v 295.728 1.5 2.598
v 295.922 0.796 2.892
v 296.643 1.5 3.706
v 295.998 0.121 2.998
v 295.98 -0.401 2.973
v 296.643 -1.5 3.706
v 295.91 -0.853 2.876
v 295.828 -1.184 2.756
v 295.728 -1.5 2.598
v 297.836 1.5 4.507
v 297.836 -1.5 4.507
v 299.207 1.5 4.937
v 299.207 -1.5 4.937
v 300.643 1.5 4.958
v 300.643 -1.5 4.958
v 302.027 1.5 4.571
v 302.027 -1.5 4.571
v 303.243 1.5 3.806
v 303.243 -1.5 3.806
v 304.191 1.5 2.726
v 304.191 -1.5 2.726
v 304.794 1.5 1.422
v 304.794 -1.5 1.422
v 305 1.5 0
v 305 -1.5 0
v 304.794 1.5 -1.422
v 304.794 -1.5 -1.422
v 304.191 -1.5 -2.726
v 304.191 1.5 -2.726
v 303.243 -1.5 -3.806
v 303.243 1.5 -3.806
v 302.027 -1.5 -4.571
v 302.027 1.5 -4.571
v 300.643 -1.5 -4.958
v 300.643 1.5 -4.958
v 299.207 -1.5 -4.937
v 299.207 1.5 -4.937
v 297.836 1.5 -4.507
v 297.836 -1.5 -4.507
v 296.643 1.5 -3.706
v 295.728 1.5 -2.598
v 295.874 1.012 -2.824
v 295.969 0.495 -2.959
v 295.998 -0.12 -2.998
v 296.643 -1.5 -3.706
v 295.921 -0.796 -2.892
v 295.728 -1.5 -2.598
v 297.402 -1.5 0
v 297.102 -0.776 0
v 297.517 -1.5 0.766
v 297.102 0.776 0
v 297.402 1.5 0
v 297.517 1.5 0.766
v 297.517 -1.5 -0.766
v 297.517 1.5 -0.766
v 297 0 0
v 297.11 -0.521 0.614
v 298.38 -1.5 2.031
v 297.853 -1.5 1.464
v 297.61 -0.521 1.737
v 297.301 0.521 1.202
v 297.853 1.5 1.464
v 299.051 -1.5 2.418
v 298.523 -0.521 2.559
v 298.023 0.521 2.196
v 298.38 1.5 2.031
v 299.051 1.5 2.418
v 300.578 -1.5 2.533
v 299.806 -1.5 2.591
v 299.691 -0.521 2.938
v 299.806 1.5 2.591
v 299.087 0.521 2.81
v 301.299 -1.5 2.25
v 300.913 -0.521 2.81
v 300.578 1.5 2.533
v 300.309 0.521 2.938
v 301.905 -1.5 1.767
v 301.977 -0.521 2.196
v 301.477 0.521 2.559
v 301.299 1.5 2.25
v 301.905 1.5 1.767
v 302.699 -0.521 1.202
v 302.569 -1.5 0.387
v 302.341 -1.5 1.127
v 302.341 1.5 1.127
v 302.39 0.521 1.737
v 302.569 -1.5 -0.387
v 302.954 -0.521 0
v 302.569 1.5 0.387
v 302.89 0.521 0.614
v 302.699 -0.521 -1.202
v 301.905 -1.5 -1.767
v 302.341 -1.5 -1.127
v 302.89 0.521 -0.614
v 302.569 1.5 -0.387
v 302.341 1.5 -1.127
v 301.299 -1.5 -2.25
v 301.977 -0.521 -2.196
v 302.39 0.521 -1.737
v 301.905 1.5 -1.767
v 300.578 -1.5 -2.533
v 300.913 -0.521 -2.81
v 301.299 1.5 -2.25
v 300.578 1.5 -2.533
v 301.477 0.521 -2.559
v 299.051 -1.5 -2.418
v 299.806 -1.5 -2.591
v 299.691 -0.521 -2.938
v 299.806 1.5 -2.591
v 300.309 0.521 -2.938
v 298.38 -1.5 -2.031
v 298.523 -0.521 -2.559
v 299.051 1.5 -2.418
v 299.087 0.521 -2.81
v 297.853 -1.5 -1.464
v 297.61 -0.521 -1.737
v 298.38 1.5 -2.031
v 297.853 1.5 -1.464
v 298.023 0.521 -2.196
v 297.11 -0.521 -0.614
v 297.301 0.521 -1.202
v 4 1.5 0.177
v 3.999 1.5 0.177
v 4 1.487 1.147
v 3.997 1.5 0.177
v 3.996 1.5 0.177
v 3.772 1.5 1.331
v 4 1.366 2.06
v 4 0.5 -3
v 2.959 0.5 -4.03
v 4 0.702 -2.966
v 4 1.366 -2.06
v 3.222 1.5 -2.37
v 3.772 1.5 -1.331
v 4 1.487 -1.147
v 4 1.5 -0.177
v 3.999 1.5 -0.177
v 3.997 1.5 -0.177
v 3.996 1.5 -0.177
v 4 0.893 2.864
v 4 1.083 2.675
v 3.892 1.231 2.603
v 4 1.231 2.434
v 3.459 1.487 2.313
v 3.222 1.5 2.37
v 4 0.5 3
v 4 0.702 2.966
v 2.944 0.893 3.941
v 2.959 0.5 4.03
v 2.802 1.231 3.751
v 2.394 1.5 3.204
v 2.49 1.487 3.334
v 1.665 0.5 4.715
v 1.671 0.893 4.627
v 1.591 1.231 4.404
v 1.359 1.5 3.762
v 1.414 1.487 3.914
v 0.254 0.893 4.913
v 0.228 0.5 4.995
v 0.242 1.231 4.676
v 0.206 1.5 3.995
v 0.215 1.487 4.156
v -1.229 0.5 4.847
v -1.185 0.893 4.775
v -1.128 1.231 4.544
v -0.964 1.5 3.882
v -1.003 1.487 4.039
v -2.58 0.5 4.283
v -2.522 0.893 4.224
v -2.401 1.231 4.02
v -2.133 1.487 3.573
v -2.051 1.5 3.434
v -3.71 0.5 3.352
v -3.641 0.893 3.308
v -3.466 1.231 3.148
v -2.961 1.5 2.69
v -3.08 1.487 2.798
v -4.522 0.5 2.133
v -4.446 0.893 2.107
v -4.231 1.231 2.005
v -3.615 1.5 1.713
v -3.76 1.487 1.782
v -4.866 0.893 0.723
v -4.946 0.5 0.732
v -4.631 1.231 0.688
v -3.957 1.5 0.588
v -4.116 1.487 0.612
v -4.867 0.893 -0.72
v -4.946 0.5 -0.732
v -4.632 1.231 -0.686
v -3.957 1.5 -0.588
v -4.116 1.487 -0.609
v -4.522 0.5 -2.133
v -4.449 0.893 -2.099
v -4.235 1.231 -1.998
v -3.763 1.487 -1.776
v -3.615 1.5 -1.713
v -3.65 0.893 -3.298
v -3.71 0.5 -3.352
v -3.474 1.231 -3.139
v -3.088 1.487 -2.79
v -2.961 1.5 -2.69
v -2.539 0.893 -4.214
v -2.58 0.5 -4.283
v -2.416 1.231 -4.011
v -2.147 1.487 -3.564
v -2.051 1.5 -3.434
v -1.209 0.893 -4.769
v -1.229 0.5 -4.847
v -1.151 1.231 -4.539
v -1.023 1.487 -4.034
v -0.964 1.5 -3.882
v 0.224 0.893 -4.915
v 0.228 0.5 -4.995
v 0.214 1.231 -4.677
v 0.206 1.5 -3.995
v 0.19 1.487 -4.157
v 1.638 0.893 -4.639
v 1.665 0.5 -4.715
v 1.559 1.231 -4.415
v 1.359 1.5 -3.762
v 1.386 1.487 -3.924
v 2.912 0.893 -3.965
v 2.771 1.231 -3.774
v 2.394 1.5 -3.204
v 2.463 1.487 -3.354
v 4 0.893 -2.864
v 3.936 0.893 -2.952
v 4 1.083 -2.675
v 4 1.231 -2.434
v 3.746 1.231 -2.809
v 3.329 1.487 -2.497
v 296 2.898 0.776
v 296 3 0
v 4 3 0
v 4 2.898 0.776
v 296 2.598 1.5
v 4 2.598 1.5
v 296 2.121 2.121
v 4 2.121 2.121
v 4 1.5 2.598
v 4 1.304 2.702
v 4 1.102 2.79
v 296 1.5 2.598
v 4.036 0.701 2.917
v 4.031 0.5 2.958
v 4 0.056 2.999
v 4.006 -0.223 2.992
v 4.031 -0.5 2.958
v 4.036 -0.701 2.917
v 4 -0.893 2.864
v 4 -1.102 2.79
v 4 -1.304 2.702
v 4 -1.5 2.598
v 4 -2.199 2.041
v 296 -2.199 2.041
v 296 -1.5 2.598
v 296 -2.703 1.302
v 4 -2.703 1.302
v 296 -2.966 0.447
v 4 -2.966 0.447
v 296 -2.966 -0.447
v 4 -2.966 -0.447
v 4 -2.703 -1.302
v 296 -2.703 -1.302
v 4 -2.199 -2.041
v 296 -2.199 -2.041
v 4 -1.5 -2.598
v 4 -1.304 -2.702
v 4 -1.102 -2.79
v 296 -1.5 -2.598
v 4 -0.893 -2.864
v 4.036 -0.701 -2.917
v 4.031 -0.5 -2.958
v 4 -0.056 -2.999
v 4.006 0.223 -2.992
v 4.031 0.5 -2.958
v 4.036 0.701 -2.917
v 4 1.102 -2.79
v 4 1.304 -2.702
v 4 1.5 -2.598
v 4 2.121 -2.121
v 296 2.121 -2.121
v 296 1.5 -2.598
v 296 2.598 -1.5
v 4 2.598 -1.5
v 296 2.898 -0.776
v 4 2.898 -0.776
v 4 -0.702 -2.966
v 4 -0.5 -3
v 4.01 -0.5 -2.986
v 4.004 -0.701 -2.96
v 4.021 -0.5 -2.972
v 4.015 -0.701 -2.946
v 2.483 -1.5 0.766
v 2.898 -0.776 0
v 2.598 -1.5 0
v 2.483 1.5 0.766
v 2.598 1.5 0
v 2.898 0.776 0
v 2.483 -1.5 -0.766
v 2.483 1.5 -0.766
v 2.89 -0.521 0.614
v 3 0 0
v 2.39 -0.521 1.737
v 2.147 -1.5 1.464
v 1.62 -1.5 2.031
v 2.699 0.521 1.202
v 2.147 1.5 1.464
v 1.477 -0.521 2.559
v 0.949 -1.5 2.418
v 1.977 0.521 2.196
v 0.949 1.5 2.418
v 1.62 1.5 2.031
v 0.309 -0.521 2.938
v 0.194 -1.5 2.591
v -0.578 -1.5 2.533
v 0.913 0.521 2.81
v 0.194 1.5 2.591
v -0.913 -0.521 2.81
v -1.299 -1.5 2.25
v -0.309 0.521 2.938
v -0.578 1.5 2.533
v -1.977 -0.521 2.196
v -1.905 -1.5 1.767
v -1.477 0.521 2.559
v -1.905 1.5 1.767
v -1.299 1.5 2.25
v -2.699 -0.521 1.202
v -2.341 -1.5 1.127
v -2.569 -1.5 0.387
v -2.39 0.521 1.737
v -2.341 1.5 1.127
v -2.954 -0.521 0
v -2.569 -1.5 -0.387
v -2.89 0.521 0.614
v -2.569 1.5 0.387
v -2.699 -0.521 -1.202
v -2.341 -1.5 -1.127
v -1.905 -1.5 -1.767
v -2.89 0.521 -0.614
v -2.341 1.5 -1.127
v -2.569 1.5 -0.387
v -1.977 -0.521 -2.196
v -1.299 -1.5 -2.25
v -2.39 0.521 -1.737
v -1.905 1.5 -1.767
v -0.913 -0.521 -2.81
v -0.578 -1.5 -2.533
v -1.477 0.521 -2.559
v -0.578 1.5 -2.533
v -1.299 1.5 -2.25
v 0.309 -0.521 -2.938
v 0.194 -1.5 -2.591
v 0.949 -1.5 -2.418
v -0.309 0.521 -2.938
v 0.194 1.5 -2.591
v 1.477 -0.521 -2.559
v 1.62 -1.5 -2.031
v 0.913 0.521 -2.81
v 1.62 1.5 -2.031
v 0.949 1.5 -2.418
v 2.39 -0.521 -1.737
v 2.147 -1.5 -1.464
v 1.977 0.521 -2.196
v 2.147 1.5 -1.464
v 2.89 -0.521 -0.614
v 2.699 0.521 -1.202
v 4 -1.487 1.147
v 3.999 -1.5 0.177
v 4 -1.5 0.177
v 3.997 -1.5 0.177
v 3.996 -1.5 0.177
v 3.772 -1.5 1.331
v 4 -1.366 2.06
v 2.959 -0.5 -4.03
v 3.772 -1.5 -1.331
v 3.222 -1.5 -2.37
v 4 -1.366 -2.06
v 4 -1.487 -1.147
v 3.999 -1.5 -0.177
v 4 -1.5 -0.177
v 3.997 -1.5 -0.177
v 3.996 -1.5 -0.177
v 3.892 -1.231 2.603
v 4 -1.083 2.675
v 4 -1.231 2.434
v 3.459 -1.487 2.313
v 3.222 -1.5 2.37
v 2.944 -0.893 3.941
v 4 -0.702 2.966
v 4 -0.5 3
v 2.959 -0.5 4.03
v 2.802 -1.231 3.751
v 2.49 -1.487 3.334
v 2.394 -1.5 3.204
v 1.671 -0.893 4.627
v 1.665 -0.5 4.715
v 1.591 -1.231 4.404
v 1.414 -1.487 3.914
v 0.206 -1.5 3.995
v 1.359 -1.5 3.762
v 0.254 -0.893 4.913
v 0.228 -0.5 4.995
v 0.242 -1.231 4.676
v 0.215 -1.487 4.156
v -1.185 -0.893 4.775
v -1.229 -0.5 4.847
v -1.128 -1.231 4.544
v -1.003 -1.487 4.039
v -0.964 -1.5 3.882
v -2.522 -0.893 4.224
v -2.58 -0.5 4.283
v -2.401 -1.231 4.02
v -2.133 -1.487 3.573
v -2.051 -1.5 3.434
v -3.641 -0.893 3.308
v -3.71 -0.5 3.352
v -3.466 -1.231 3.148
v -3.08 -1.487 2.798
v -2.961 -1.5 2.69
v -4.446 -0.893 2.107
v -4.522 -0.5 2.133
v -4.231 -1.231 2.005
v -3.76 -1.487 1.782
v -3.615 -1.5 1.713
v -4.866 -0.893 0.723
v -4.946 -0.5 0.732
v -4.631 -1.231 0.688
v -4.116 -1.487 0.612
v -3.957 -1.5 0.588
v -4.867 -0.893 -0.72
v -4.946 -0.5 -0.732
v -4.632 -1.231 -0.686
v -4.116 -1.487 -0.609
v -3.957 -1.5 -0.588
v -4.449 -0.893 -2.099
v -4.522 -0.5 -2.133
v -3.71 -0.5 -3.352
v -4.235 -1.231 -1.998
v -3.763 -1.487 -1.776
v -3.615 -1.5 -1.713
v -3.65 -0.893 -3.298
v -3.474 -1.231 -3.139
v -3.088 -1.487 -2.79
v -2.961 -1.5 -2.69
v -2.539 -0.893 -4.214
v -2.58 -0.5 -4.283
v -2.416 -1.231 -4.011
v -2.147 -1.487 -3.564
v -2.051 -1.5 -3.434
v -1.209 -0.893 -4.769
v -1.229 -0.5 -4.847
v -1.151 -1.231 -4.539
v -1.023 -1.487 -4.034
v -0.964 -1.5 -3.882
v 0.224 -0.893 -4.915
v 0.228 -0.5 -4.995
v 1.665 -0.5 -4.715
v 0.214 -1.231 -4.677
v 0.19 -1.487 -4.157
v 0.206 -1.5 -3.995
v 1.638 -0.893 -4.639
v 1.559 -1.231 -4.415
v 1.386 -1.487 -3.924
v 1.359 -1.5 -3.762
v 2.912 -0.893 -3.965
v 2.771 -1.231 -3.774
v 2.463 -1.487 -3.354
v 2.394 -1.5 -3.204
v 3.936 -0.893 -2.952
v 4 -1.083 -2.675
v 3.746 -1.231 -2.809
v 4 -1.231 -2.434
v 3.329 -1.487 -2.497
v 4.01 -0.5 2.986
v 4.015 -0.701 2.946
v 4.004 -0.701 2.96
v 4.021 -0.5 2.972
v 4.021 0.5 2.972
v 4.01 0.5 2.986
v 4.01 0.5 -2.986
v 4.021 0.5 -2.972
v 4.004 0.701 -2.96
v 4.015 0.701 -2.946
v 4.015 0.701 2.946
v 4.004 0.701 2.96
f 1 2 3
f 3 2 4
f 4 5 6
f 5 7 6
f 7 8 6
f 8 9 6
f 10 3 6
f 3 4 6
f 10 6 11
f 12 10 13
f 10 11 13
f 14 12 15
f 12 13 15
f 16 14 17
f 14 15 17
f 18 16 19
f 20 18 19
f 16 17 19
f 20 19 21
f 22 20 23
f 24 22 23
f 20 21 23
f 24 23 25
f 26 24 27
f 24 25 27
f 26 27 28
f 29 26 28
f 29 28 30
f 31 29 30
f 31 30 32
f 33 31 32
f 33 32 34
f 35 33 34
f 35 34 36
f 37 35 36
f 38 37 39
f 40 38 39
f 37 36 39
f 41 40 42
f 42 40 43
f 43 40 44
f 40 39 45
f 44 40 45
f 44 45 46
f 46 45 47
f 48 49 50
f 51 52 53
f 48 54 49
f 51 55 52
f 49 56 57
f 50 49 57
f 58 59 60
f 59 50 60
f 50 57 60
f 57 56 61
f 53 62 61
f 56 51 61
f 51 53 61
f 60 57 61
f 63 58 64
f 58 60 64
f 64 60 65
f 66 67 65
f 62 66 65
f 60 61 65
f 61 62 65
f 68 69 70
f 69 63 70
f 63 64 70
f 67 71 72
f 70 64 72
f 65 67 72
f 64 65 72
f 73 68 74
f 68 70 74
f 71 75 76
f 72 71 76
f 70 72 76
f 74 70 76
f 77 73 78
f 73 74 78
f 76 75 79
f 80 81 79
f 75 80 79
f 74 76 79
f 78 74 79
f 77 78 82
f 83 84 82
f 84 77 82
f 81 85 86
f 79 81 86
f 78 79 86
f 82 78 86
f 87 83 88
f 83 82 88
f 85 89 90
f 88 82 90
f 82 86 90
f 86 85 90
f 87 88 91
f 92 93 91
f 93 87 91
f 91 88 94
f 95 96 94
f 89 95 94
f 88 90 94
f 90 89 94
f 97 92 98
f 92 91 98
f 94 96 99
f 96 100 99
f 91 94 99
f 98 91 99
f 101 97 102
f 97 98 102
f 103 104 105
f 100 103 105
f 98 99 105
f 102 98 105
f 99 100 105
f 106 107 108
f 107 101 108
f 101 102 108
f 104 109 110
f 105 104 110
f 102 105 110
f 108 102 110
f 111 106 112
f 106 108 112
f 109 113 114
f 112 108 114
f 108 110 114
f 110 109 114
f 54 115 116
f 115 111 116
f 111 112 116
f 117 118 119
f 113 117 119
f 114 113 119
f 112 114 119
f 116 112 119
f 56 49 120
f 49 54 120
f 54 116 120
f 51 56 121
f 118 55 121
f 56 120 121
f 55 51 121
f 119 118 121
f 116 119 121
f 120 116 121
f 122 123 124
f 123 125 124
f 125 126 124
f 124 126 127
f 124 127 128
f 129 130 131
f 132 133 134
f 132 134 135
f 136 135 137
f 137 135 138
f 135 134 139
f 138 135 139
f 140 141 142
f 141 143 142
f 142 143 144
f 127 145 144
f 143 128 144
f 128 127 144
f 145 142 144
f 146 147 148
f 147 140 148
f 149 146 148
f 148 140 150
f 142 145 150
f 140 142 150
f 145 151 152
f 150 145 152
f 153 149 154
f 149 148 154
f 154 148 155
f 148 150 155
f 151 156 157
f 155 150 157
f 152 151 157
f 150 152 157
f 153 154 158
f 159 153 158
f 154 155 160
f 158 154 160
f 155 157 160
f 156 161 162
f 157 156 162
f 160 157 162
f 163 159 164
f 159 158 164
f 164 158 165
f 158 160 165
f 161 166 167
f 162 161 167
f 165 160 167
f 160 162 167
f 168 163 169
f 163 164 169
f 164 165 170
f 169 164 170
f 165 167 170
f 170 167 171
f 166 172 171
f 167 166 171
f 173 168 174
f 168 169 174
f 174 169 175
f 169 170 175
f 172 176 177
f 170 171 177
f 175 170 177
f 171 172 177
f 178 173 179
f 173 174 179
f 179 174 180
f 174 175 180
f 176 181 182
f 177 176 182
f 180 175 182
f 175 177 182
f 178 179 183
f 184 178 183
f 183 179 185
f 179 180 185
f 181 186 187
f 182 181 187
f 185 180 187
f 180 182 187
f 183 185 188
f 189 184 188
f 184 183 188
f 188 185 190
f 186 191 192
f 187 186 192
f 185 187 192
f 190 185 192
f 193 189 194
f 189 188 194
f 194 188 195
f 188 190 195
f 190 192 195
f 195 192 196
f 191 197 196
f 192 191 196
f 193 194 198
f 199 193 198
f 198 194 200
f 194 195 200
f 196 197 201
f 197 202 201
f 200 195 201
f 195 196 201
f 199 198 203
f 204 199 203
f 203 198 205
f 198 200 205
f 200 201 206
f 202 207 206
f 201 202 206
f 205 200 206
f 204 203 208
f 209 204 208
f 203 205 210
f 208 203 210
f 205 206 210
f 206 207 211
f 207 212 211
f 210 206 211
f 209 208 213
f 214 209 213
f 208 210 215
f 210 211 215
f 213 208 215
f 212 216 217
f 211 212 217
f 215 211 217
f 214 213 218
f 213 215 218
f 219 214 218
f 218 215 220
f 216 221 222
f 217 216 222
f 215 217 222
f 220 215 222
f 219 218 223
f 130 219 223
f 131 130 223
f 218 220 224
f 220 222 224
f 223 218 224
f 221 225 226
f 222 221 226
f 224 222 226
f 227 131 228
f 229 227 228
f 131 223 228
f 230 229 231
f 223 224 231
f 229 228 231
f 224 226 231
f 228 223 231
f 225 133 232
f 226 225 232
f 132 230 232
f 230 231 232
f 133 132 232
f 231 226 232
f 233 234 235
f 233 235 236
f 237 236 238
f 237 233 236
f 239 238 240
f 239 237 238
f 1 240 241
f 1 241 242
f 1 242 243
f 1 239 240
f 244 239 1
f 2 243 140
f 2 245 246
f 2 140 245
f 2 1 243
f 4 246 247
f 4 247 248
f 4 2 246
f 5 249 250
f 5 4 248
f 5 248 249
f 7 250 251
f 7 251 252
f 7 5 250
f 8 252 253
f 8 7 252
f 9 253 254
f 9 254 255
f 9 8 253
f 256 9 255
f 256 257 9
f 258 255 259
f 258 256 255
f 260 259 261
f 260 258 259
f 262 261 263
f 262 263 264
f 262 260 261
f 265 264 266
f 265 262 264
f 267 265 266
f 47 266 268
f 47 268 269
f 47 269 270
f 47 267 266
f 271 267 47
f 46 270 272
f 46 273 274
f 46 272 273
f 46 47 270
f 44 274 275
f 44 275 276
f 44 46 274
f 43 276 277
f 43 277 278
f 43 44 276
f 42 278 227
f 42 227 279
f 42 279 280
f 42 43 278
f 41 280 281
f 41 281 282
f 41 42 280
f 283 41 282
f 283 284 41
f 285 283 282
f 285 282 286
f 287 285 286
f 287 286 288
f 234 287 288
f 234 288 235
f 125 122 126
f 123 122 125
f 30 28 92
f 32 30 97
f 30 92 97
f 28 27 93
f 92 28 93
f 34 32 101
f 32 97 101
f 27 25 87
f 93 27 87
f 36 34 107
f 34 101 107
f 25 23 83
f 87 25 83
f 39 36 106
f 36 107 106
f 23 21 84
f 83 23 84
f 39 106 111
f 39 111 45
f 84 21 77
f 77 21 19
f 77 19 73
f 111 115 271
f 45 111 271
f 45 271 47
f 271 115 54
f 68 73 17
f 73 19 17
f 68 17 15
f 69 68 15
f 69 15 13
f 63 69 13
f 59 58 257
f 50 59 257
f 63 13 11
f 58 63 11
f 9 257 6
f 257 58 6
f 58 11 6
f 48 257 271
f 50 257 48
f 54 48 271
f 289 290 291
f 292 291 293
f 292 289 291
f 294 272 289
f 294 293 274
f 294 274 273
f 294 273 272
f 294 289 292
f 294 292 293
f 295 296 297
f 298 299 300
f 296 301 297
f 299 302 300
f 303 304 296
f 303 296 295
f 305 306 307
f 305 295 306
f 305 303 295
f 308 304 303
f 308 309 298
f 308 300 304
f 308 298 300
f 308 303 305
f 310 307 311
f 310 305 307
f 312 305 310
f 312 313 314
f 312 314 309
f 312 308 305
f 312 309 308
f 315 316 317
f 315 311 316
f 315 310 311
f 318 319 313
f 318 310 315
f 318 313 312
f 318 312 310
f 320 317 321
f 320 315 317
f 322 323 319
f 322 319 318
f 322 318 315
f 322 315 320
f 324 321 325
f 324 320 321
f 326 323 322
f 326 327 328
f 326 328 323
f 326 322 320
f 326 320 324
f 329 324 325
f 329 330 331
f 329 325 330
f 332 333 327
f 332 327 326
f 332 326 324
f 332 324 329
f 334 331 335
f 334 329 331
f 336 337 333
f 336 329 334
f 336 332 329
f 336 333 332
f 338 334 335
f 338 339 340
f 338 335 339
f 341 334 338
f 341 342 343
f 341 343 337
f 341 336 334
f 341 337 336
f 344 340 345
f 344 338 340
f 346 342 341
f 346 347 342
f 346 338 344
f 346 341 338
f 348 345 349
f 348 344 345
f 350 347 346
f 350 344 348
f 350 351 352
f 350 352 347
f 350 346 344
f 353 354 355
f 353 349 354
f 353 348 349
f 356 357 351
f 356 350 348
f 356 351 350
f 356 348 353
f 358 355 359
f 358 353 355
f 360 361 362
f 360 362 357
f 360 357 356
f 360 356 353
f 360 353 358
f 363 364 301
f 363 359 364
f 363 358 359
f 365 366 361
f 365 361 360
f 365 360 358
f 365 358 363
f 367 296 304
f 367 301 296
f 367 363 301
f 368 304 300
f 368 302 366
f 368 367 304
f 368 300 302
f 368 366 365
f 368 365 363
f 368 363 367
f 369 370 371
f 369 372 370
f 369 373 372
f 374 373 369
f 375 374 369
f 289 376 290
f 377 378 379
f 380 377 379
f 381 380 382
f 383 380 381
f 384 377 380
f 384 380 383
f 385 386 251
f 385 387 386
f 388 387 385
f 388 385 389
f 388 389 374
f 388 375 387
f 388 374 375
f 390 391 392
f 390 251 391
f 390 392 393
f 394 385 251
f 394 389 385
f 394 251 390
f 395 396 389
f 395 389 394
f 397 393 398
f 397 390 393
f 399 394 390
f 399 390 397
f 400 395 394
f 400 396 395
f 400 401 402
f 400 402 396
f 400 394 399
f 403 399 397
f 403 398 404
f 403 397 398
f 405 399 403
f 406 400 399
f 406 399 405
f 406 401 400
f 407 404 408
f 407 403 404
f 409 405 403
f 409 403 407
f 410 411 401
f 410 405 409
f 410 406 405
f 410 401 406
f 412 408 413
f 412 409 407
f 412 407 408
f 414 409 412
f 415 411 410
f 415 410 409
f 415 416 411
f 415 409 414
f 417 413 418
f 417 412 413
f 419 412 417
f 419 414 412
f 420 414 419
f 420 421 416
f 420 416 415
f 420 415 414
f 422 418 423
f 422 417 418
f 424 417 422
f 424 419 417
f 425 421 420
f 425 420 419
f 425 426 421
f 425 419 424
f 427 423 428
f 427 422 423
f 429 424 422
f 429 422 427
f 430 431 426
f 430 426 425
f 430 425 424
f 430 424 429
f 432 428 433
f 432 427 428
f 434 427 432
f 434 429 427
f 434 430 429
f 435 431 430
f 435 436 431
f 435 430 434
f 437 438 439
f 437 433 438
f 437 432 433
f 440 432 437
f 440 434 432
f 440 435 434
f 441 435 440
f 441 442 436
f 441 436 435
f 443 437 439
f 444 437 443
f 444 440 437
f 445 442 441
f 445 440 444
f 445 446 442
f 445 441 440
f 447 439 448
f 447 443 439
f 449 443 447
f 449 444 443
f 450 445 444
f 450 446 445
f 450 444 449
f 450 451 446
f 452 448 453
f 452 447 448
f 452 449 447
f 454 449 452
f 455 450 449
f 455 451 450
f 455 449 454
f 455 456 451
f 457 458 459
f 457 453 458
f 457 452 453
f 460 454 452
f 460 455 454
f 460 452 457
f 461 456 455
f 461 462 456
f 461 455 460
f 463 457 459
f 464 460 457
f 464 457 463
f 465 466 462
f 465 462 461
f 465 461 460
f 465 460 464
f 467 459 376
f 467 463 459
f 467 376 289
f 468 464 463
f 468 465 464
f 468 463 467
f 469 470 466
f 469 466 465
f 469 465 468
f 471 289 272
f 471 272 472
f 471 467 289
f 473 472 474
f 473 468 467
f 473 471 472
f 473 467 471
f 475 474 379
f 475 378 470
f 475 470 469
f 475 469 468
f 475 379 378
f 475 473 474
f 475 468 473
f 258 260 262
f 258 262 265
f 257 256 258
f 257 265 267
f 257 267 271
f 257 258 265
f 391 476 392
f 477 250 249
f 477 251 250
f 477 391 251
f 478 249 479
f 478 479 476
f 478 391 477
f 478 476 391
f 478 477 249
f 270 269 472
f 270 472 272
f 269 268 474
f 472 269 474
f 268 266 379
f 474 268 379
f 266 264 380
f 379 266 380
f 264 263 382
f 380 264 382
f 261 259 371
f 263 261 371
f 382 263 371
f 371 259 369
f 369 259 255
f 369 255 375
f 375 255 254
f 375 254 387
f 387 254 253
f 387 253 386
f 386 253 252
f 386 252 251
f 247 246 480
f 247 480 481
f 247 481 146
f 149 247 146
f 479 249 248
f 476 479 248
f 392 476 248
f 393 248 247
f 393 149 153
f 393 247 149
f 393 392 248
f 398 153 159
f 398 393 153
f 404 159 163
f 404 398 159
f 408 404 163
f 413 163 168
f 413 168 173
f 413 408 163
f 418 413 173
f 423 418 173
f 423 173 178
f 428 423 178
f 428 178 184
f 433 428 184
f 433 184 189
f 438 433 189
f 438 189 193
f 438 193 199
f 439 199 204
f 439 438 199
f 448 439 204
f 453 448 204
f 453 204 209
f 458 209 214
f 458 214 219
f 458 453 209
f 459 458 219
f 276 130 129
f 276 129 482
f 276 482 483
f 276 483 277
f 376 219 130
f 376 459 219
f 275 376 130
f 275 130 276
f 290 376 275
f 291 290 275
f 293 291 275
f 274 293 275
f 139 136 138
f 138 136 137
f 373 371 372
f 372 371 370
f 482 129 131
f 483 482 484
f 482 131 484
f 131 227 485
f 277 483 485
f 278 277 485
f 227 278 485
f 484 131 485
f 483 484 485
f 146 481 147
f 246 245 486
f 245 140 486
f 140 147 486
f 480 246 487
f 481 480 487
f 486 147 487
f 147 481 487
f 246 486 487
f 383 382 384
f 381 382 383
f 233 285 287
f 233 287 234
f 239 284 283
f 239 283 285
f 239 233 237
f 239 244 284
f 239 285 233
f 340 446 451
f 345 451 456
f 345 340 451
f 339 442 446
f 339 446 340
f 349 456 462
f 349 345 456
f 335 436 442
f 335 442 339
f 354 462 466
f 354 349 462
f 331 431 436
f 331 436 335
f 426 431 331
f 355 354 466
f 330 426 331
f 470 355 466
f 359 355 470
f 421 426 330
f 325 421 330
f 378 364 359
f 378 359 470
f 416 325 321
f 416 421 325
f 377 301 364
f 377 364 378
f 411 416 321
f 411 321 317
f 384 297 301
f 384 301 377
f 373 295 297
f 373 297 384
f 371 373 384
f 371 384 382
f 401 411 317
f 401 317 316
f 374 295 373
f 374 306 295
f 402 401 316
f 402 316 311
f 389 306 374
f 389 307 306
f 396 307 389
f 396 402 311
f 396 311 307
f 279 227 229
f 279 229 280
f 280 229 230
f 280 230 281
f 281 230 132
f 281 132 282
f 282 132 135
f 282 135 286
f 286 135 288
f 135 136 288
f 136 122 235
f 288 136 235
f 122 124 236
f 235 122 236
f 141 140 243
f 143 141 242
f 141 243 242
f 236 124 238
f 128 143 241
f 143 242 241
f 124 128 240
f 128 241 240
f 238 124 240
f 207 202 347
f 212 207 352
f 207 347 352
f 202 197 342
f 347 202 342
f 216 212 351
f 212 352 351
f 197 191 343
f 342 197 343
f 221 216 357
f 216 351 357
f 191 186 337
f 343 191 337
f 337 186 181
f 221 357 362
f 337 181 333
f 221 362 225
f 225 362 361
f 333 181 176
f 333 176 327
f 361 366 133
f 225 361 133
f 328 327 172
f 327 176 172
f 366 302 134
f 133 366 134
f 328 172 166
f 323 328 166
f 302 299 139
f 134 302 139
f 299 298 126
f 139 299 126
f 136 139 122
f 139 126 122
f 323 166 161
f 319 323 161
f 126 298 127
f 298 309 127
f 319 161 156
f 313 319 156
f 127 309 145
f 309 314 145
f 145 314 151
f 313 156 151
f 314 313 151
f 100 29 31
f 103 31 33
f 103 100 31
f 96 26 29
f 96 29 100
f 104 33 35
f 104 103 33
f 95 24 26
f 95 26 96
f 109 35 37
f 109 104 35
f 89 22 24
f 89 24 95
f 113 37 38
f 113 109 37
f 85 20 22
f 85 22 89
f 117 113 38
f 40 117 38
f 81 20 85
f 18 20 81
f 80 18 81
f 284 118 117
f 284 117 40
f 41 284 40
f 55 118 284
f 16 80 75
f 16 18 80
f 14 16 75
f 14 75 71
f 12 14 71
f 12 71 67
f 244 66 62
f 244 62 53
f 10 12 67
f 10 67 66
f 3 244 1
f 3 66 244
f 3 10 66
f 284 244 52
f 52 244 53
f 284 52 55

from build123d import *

# Parameters (mm, degrees)
F1_R         = 5
F1_R_2       = 2
F2_DEPTH     = 1.5
F5_R         = 3
F6_DEPTH     = 146
F9_T4_ANGLE  = 354.9348896549
F9_T9_ANGLE  = 354.9348896549
F9_S10_R     = 3
F9_T11_DEPTH = 9
F9_T15_ANGLE = 354.9348896549
F9_T20_ANGLE = 354.9348896549
F9_S21_R     = 3
F9_T22_DEPTH = 9


# Not quite as in the source:
# - a fillet or chamfer that OpenCascade refuses, or shapes differently, is made with other operations: its cross-section is extruded or revolved along the edge and cut away or added


with BuildPart() as f2:
    # F1 (on Front) → F2 (new body, symmetric)
    with BuildSketch(Plane.XZ):
        Circle(F1_R)
        Circle(F1_R_2, mode=Mode.SUBTRACT)
    extrude(amount=F2_DEPTH, both=True)

    # F0 (on Top) → F3 (revolve, cut)
    with BuildSketch(Plane.XY):
        with BuildLine():
            Line((1.5, 2.5980762114), (1.5, -2.5980762114))
            ThreePointArc((1.5, -2.5980762114), (3, 0), (1.5, 2.5980762114))
        make_face()
    revolve(axis=Axis((0, 0.5133161101, 0), (0, -1, 0)), mode=Mode.SUBTRACT)

    # F5 (on offset) → F6 (join)
    with BuildSketch(Plane.YZ.offset(4)):
        Circle(F5_R)
    extrude(amount=F6_DEPTH)

    # F8: F2 across plane


with BuildPart() as f2_1:
    add(f2.part)
    add(f2.part.mirror(Plane.YZ.offset(150)))

    # F9: fillet of radius 1 on 2 edges, made by hand


with BuildPart() as f9_tool2:
    # F9_s3 → F9_t4 (revolve)
    with BuildSketch(Plane(origin=(0, 0, 0), x_dir=(0, 1, 0), z_dir=(0.0441870344, 0, -0.999023276))):
        with BuildLine():
            ThreePointArc((-0.5, 5), (-1.2071067812, 4.7071067812), (-1.5, 4))
            Line((-1.5, 4), (-1.5, 5))
            Line((-1.5, 5), (-0.5, 5))
        make_face()
    revolve(axis=Axis((0, -1.5, 0), (0, -1, 0)), revolution_arc=F9_T4_ANGLE)

    split(bisect_by=Plane.YZ.offset(4), keep=Keep.BOTTOM)


with BuildPart() as f2_2:
    add(f2_1.part)

    # F9_t1: cut F9_tool2
    add(f9_tool2.part, mode=Mode.SUBTRACT)


with BuildPart() as f9_tool7:
    # F9_s8 → F9_t9 (revolve)
    with BuildSketch(Plane(origin=(0, 0, 0), x_dir=(0, 1, 0), z_dir=(0.0441870344, 0, -0.999023276))):
        with BuildLine():
            ThreePointArc((-0.5, 5), (-1.2071067812, 4.7071067812), (-1.5, 4))
            Line((-1.5, 4), (-1.5, 5))
            Line((-1.5, 5), (-0.5, 5))
        make_face()
    revolve(axis=Axis((0, -1.5, 0), (0, -1, 0)), revolution_arc=F9_T9_ANGLE)

    # F9_s10 → F9_t11 (cut, symmetric)
    with BuildSketch(Plane.YZ):
        Circle(F9_S10_R)
    extrude(amount=F9_T11_DEPTH, both=True, mode=Mode.SUBTRACT)


with BuildPart() as f2_3:
    add(f2_2.part)

    # F9_t6: cut F9_tool7
    add(f9_tool7.part, mode=Mode.SUBTRACT)


with BuildPart() as f9_tool13:
    # F9_s14 → F9_t15 (revolve)
    with BuildSketch(Plane(origin=(0, 0, 0), x_dir=(0, 1, 0), z_dir=(0.0441870344, 0, -0.999023276))):
        with BuildLine():
            ThreePointArc((0.5, 5), (1.2071067812, 4.7071067812), (1.5, 4))
            Line((1.5, 4), (1.5, 5))
            Line((1.5, 5), (0.5, 5))
        make_face()
    revolve(axis=Axis((0, 1.5, 0), (0, -1, 0)), revolution_arc=F9_T15_ANGLE)

    split(bisect_by=Plane.YZ.offset(4), keep=Keep.BOTTOM)


with BuildPart() as f2_4:
    add(f2_3.part)

    # F9_t12: cut F9_tool13
    add(f9_tool13.part, mode=Mode.SUBTRACT)


with BuildPart() as f9_tool18:
    # F9_s19 → F9_t20 (revolve)
    with BuildSketch(Plane(origin=(0, 0, 0), x_dir=(0, 1, 0), z_dir=(0.0441870344, 0, -0.999023276))):
        with BuildLine():
            ThreePointArc((0.5, 5), (1.2071067812, 4.7071067812), (1.5, 4))
            Line((1.5, 4), (1.5, 5))
            Line((1.5, 5), (0.5, 5))
        make_face()
    revolve(axis=Axis((0, 1.5, 0), (0, -1, 0)), revolution_arc=F9_T20_ANGLE)

    # F9_s21 → F9_t22 (cut, symmetric)
    with BuildSketch(Plane.YZ):
        Circle(F9_S21_R)
    extrude(amount=F9_T22_DEPTH, both=True, mode=Mode.SUBTRACT)


with BuildPart() as f2_5:
    add(f2_4.part)

    # F9_t17: cut F9_tool18
    add(f9_tool18.part, mode=Mode.SUBTRACT)


solid = f2_5.part
